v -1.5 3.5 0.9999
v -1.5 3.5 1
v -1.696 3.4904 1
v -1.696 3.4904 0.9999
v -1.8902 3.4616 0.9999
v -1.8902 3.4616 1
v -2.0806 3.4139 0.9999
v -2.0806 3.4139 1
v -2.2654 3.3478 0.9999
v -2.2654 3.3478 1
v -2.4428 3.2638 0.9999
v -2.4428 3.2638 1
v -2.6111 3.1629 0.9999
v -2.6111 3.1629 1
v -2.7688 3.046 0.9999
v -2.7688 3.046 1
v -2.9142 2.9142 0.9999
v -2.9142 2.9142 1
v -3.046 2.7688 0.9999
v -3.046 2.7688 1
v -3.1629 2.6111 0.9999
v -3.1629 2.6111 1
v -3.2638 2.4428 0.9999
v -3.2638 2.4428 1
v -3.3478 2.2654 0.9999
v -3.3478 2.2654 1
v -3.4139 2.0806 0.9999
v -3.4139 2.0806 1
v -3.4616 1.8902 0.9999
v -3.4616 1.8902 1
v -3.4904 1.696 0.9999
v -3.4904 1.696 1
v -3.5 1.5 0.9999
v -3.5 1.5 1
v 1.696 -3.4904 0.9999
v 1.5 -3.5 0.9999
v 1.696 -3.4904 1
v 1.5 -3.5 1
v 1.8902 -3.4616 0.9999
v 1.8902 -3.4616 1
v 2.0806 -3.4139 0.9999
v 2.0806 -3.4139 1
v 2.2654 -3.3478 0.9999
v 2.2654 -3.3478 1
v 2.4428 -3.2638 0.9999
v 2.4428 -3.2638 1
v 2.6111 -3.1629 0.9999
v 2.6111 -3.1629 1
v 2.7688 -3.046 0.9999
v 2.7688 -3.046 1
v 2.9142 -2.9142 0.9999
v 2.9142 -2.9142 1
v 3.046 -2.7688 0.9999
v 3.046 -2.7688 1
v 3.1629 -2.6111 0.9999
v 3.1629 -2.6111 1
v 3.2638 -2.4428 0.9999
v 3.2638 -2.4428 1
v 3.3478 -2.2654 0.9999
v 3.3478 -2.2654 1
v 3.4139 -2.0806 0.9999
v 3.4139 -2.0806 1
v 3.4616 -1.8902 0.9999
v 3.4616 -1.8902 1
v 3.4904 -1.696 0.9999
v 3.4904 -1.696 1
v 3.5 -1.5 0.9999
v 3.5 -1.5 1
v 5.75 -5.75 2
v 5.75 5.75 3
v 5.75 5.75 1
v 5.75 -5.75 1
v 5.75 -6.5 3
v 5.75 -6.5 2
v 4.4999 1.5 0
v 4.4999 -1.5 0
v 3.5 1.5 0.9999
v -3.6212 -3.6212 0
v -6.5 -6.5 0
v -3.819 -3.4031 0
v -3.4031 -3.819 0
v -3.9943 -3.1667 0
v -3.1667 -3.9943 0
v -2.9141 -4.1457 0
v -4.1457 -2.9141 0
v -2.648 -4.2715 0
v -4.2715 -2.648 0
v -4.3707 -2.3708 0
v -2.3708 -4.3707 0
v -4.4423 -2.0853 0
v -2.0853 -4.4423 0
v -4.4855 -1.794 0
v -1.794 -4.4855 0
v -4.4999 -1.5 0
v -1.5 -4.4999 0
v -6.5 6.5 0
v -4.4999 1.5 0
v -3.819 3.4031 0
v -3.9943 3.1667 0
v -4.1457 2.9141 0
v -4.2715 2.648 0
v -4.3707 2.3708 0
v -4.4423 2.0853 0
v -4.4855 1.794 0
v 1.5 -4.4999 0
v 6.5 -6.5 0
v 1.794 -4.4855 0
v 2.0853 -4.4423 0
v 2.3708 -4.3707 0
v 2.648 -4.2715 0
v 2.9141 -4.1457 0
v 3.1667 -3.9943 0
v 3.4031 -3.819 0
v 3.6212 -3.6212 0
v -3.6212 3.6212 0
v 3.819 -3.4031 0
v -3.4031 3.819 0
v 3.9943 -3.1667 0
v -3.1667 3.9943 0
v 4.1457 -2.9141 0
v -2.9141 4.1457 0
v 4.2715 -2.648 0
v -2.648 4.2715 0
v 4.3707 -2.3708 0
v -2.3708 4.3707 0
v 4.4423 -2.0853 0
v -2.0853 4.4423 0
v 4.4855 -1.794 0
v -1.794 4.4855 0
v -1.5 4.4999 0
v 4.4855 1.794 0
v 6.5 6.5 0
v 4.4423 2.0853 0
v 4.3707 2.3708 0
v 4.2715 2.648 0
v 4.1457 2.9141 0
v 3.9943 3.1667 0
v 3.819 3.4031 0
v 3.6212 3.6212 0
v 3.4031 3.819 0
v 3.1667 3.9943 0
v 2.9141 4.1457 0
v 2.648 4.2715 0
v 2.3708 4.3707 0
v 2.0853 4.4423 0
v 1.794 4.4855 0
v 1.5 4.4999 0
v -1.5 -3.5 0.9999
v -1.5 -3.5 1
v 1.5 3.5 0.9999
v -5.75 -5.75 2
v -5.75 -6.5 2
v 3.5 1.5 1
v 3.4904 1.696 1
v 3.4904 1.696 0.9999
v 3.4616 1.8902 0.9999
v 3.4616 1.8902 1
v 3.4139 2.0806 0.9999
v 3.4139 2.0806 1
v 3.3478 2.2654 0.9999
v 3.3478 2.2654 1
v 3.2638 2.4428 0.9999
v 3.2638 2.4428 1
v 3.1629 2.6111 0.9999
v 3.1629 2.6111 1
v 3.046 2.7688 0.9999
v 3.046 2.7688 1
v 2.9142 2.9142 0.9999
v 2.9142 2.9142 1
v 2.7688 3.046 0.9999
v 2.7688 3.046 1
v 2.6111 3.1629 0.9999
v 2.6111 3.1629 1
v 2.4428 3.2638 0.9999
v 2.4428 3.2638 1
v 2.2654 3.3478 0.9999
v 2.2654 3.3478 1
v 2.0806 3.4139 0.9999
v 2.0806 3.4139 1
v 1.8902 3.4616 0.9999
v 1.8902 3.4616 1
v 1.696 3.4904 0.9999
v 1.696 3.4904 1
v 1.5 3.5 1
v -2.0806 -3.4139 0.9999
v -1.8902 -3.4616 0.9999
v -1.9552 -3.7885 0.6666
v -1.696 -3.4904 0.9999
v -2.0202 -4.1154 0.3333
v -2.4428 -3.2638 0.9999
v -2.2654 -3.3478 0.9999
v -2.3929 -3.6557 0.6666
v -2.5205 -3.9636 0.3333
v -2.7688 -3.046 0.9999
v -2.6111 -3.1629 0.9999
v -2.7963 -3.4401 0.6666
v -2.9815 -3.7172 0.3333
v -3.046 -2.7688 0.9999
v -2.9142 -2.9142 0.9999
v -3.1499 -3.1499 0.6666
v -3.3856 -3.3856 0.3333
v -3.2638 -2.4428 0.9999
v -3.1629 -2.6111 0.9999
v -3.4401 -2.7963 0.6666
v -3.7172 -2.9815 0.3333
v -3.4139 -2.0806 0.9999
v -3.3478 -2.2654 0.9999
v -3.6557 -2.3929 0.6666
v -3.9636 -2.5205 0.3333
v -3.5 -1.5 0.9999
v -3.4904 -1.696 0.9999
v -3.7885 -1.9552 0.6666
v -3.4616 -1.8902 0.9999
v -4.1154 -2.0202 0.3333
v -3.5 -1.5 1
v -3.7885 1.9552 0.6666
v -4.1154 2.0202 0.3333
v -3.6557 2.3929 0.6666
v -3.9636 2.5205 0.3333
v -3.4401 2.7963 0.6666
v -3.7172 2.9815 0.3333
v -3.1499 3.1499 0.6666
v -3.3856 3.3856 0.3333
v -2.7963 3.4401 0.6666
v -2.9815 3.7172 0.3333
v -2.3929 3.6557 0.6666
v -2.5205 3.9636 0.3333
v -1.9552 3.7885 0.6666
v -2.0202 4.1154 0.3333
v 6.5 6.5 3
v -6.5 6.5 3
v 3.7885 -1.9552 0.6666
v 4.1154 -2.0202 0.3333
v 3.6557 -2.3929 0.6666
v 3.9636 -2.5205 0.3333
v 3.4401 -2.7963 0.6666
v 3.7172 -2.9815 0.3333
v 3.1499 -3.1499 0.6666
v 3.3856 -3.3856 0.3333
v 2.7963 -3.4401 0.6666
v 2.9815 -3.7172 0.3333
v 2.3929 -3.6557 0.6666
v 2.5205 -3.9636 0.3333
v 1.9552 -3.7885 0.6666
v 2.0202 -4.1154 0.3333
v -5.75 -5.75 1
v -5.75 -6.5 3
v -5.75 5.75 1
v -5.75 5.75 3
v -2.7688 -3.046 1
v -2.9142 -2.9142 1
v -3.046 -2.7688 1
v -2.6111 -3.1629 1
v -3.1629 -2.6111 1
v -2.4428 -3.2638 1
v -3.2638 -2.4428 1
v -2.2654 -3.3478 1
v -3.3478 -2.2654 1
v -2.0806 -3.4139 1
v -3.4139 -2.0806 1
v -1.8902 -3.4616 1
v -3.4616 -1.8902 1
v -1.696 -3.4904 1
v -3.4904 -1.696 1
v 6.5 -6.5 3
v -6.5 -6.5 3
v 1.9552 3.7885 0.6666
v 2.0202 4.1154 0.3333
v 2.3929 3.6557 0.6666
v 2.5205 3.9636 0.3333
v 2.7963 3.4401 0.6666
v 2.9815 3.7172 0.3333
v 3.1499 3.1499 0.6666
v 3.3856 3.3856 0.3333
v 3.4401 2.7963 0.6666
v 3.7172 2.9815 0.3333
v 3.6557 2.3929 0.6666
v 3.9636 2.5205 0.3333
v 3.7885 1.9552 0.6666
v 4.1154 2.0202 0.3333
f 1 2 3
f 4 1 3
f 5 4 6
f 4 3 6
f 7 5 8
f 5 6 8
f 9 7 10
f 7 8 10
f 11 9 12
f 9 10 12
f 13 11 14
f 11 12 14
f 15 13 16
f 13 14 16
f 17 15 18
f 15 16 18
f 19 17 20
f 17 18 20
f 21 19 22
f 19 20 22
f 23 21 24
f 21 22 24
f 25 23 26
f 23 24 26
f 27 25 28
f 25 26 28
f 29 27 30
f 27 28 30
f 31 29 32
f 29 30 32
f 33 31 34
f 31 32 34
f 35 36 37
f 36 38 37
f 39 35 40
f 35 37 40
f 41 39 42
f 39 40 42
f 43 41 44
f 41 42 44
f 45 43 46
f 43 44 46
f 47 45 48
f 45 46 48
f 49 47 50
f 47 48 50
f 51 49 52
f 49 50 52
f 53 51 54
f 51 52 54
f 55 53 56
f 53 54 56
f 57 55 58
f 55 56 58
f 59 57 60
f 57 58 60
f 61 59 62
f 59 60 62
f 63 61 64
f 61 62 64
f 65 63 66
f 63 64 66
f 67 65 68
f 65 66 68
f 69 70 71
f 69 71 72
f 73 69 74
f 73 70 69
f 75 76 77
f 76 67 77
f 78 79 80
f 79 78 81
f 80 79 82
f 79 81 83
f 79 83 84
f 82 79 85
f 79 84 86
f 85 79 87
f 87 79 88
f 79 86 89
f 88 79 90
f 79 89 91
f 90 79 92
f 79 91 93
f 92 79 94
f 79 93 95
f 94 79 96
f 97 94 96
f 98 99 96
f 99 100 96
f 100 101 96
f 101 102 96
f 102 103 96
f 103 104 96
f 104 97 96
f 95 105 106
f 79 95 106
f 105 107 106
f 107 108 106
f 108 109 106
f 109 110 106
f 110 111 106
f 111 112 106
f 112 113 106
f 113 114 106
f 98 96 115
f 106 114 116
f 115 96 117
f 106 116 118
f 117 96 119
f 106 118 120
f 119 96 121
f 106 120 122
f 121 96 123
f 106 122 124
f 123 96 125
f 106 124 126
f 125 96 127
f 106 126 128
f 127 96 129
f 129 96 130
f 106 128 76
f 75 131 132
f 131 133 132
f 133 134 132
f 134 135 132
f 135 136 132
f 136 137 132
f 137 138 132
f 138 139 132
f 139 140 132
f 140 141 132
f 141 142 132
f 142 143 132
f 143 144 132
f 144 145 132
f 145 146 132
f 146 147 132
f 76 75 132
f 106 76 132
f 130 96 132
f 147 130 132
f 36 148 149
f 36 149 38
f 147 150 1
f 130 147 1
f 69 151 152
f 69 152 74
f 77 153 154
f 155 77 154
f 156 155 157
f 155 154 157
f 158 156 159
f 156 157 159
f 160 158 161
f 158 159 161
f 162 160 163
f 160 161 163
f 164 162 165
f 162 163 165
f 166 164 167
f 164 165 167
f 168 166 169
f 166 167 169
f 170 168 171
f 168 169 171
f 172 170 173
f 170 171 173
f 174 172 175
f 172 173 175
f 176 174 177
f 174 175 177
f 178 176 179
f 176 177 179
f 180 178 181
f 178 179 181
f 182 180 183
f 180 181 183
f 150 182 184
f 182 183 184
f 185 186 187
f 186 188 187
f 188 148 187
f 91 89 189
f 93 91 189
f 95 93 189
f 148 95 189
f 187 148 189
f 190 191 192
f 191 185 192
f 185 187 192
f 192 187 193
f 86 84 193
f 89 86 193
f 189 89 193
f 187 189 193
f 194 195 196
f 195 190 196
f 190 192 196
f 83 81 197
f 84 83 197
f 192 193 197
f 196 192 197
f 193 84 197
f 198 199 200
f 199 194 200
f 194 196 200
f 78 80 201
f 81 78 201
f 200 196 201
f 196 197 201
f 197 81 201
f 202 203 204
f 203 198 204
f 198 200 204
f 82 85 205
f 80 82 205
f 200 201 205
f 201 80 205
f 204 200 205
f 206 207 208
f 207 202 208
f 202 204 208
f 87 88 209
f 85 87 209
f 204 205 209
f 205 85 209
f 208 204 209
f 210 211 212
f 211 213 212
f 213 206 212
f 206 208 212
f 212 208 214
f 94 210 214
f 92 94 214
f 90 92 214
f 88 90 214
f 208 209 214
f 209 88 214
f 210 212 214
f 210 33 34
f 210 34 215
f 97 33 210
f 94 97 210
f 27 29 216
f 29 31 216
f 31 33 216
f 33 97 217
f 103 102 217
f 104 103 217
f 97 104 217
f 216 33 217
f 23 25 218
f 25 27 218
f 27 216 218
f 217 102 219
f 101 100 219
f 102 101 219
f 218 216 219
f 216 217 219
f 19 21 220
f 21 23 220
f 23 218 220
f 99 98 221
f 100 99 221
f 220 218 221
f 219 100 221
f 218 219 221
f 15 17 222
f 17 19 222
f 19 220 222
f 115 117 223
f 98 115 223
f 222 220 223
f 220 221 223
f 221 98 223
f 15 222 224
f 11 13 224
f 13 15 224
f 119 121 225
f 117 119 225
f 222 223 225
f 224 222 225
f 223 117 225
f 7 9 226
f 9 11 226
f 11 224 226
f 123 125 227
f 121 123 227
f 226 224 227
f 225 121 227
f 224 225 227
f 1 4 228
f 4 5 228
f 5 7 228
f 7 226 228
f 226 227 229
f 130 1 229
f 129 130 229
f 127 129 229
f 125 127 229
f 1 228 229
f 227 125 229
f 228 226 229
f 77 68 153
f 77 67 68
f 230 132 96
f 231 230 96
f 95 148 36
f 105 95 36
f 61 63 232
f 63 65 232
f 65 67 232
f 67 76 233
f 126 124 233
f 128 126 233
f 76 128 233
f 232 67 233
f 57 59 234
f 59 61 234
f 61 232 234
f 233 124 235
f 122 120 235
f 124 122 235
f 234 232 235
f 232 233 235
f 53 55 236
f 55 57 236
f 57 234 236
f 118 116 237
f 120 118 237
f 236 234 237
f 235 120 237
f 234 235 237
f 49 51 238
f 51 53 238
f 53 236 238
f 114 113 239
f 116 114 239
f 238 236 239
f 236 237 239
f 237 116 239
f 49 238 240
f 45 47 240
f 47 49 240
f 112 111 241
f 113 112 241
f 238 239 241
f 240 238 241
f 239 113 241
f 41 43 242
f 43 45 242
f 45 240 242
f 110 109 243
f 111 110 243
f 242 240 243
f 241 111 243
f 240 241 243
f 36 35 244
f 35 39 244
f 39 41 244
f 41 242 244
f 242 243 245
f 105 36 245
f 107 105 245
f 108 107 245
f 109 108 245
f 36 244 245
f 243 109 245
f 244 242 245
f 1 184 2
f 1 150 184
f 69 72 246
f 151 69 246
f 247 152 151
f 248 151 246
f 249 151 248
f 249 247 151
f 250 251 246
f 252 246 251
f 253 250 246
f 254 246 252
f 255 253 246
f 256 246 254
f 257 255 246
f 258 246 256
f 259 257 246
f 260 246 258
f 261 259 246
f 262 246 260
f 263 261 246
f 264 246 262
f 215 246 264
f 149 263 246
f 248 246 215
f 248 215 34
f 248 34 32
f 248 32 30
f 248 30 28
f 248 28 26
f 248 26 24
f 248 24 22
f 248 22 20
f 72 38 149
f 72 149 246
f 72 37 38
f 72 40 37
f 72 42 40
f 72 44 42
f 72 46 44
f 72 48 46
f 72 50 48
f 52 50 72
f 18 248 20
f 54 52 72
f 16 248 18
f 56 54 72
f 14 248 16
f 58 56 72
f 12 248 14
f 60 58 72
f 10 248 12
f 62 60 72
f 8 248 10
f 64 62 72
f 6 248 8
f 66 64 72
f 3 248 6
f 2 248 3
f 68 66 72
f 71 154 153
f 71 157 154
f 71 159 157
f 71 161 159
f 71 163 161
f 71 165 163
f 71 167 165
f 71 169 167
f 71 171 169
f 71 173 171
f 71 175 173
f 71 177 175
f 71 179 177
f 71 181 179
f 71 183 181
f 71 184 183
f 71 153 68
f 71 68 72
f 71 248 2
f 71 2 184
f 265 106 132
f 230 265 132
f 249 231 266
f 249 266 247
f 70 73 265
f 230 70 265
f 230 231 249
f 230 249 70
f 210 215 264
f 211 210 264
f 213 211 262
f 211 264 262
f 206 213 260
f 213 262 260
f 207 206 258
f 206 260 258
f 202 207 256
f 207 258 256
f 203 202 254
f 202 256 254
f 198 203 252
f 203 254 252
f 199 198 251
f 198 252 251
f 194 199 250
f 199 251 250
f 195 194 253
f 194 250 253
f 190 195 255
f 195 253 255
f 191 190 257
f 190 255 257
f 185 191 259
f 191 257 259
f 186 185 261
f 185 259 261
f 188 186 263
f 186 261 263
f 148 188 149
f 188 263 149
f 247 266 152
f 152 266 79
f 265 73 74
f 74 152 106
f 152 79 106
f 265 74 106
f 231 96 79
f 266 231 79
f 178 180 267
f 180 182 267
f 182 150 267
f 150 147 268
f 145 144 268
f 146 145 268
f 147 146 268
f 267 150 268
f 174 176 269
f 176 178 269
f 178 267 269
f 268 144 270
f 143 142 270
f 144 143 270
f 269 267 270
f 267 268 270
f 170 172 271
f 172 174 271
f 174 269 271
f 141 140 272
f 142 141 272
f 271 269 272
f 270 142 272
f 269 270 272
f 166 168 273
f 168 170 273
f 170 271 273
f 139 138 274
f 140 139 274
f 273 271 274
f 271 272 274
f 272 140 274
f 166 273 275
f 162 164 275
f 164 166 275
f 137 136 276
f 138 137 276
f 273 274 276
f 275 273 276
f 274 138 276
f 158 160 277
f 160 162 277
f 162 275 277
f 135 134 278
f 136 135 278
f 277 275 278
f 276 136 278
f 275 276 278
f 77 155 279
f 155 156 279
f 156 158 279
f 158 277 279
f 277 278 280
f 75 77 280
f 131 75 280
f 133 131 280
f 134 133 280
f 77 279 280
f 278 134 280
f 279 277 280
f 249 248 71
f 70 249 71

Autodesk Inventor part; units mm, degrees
ref_plane "YZ Plane" through (0, 0, 0) normal (1, 0, 0) x (0, 1, 0)
ref_plane "XZ Plane" through (0, 0, 0) normal (0, 1, 0) x (-1, 0, 0)
ref_plane "XY Plane" through (0, 0, 0) normal (0, 0, 1) x (1, 0, 0)
sketch "Sketch2" plane through (0, 0, 0) normal (0, 0, 1) x (1, 0, 0)
  line L0 (-6.5, -6.5) -> (6.5, -6.5)
  line L1 (6.5, -6.5) -> (6.5, 6.5)
  line L2 (6.5, 6.5) -> (-6.5, 6.5)
  line L3 (-6.5, 6.5) -> (-6.5, -6.5)
  line L4 (-6.5, -6.5) -> (6.5, 6.5) construction
  line L5 (6.5, -6.5) -> (-6.5, 6.5) construction
  line L6 (-5.25, -5.25) -> (5.25, -5.25)
  line L7 (5.25, -5.25) -> (5.25, 5.25)
  line L8 (5.25, 5.25) -> (-5.25, 5.25)
  line L9 (-5.25, 5.25) -> (-5.25, -5.25)
  line L10 (-5.25, -5.25) -> (5.25, 5.25) construction
  line L11 (5.25, -5.25) -> (-5.25, 5.25) construction
  line L12 (-5.75, 5.75) -> (5.75, 5.75)
  line L13 (5.75, 5.75) -> (5.75, -5.75)
  line L14 (5.75, -5.75) -> (-5.75, -5.75)
  line L15 (-5.75, -5.75) -> (-5.75, 5.75)
  line L16 (-3.5, -3.5) -> (3.5, -3.5)
  line L17 (3.5, -3.5) -> (3.5, 3.5)
  line L18 (3.5, 3.5) -> (-3.5, 3.5)
  line L19 (-3.5, 3.5) -> (-3.5, -3.5)
  line L20 (-3.5, -3.5) -> (3.5, 3.5) construction
  line L21 (3.5, -3.5) -> (-3.5, 3.5) construction
  point P0 (0, 0)
  dimension "d0" = 13
  dimension "d1" = 13
  dimension "d2" = 10.5
  dimension "d3" = 10.5
  dimension "d4" = 0.5
  dimension "d5" = 7
  dimension "d6" = 7
extrude "Extrusion1" add sketch "Sketch2" along normal blind 3 contours L3 L2 L1 L0
extrude "Extrusion2" add sketch "Sketch2" along normal blind 1 contours L9 L8 L7 L6 | L12 L13 L14 L15 | L19 L18 L17 L16
extrude "Extrusion3" cut sketch "Sketch2" along normal blind 1 contours L19 L18 L17 L16
fillet "Fillet1" radius 2 4 edges at (-3.5, 3.5, 0.5) (-3.5, -3.5, 0.5) (3.5, 3.5, 0.5) (3.5, -3.5, 0.5)
chamfer "Chamfer1" distance 1 angle 45 8 edges at (0, 3.5, 0) (-2.9142, 2.9142, 0) (-3.5, 0, 0) (-2.9142, -2.9142, 0) (0, -3.5, 0) (2.9142, -2.9142, 0) (3.5, 0, 0) (2.9142, 2.9142, 0)
sketch "Sketch3" plane through (0, 0, 3) normal (0, 0, 1) x (1, 0, 0)
  line L0 (5.75, -5.75) -> (-5.75, -5.75) projected
  line L1 (-6.5, -6.5) -> (6.5, -6.5) projected
  line L2 (-5.75, -5.75) -> (5.75, -5.75)
  line L3 (5.75, -5.75) -> (5.75, -6.5)
  line L4 (5.75, -6.5) -> (-5.75, -6.5)
  line L5 (-5.75, -6.5) -> (-5.75, -5.75)
  point P0 (0, 0)
  dimension "d17" = 11.5
extrude "Extrusion4" cut sketch "Sketch3" against normal blind 1
properties part number "Optical module_lid" material "PET Plastic"
